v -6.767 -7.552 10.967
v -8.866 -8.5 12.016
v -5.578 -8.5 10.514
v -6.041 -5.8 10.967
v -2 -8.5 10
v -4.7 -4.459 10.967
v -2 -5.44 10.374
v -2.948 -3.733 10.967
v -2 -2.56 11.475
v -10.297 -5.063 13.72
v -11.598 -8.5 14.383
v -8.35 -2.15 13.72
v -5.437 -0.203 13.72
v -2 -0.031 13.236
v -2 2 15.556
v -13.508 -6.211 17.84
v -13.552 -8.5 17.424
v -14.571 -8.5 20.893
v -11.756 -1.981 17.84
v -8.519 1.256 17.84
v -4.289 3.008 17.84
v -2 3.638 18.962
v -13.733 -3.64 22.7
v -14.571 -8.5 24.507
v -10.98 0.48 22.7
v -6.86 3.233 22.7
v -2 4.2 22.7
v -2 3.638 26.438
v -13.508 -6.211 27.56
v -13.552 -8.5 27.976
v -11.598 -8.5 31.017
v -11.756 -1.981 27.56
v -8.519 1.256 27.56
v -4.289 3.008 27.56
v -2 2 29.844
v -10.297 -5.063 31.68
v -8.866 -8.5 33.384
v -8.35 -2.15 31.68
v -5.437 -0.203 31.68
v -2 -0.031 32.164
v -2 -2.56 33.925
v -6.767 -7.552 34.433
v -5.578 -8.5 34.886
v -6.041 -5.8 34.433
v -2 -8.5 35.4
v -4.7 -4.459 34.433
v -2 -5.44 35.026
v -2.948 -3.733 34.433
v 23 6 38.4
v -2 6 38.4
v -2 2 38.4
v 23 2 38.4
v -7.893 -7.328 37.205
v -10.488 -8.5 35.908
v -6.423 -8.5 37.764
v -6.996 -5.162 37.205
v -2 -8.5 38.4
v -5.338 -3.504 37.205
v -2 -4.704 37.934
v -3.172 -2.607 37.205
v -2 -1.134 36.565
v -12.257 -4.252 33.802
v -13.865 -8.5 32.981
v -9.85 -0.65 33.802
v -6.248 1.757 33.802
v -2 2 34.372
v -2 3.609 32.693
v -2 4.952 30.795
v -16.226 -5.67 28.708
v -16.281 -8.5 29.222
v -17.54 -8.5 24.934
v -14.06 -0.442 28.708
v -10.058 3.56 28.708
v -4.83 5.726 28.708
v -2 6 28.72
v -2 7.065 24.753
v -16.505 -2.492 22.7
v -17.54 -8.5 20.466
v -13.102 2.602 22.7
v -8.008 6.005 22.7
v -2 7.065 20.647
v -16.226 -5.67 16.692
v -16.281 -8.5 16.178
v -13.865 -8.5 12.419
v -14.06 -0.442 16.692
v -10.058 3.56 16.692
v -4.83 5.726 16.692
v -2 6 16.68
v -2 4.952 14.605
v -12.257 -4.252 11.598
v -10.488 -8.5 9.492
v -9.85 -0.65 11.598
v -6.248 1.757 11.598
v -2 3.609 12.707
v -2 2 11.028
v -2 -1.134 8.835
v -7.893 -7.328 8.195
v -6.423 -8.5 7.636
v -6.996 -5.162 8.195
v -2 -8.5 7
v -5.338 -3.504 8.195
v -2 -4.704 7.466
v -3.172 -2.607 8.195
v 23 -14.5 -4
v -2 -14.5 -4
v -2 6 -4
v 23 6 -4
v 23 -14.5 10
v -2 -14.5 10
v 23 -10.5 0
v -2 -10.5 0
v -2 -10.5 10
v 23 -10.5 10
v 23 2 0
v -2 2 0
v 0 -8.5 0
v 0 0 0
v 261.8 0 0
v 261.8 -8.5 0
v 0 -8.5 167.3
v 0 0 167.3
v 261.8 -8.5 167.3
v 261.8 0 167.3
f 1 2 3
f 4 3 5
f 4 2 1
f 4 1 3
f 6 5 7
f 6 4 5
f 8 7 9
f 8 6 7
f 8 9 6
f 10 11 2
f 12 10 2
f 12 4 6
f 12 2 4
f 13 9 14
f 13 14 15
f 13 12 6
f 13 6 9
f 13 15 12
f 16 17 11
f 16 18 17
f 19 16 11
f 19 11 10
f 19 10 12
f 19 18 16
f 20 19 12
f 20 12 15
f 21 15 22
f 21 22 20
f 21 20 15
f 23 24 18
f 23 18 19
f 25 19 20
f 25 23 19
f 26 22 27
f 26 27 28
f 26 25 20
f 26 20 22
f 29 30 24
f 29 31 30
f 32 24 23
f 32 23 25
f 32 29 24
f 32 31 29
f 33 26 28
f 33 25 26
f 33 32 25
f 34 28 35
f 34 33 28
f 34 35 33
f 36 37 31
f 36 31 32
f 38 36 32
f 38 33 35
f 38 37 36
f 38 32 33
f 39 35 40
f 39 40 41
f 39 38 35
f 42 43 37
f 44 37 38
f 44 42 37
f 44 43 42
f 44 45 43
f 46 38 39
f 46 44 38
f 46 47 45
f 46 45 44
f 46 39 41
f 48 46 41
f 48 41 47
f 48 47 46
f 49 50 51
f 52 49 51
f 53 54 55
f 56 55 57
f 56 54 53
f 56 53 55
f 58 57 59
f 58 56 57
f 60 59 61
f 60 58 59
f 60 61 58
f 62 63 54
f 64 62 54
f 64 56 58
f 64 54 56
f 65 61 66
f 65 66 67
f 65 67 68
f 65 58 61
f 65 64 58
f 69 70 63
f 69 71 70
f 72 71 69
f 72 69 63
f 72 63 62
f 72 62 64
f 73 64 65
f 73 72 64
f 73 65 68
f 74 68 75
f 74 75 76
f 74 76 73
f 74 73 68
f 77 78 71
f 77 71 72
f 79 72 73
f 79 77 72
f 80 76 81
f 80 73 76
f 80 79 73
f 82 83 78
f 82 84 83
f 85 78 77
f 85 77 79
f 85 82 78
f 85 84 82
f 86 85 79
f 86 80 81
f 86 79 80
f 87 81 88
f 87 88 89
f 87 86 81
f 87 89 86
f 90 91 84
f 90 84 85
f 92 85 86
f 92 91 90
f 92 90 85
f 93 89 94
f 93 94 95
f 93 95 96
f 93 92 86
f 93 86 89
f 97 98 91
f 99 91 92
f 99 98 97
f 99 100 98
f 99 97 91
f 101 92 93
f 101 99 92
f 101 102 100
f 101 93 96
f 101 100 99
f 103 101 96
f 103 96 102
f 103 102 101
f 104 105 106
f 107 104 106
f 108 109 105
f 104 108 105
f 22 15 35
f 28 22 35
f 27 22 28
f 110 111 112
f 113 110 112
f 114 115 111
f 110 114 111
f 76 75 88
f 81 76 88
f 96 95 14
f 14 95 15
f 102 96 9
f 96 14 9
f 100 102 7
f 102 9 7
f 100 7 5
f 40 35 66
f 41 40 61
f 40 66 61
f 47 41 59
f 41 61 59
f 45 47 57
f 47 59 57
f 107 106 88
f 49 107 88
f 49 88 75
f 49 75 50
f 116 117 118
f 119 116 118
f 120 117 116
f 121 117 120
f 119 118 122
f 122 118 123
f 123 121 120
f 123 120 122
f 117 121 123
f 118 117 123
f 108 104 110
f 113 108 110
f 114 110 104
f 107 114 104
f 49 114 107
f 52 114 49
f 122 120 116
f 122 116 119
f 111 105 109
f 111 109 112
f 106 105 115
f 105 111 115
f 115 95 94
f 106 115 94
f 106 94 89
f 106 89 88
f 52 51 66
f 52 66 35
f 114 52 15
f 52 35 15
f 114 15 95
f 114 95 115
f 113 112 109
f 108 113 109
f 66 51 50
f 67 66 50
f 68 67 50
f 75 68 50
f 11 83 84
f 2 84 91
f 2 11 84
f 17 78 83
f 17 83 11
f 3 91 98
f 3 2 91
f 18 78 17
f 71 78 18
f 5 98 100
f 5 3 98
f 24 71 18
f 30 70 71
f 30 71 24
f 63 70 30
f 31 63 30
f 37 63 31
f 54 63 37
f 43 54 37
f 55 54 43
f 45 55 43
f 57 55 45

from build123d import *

# Parameters (mm, degrees)
F0_W     = 261.8
F0_H     = 167.3
F1_DEPTH = 8.5
F3_ANGLE = 90
F5_DEPTH = 25


with BuildPart() as f1:
    # F0 (on Front) → F1 (new body)
    with BuildSketch(Plane.XZ):
        with Locations((130.9, 83.65)):
            Rectangle(F0_W, F0_H)
    extrude(amount=F1_DEPTH)


with BuildPart() as f3:
    # F2 (on face) → F3 (revolve)
    with BuildSketch(Plane.XZ.offset(8.5)):
        with BuildLine():
            Line((-2, 35.4), (-2, 38.4))
            ThreePointArc((-2, 38.4), (-17.7, 22.7), (-2, 7))
            Line((-2, 7), (-2, 10))
            ThreePointArc((-2, 10), (-14.7, 22.7), (-2, 35.4))
        make_face()
    revolve(axis=Axis((-2, -8.5, 29.05), (0, 0, -1)), revolution_arc=F3_ANGLE)

    # F4 (on face) → F5 (join)
    with BuildSketch(Plane.YZ.offset(-2)):
        Polygon((6, 38.4), (2, 38.4), (2, 0), (-10.5, 0), (-10.5, 10), (-14.5, 10), (-14.5, -4), (6, -4), align=None)
    extrude(amount=F5_DEPTH)


solid = Compound([f1.part, f3.part])
